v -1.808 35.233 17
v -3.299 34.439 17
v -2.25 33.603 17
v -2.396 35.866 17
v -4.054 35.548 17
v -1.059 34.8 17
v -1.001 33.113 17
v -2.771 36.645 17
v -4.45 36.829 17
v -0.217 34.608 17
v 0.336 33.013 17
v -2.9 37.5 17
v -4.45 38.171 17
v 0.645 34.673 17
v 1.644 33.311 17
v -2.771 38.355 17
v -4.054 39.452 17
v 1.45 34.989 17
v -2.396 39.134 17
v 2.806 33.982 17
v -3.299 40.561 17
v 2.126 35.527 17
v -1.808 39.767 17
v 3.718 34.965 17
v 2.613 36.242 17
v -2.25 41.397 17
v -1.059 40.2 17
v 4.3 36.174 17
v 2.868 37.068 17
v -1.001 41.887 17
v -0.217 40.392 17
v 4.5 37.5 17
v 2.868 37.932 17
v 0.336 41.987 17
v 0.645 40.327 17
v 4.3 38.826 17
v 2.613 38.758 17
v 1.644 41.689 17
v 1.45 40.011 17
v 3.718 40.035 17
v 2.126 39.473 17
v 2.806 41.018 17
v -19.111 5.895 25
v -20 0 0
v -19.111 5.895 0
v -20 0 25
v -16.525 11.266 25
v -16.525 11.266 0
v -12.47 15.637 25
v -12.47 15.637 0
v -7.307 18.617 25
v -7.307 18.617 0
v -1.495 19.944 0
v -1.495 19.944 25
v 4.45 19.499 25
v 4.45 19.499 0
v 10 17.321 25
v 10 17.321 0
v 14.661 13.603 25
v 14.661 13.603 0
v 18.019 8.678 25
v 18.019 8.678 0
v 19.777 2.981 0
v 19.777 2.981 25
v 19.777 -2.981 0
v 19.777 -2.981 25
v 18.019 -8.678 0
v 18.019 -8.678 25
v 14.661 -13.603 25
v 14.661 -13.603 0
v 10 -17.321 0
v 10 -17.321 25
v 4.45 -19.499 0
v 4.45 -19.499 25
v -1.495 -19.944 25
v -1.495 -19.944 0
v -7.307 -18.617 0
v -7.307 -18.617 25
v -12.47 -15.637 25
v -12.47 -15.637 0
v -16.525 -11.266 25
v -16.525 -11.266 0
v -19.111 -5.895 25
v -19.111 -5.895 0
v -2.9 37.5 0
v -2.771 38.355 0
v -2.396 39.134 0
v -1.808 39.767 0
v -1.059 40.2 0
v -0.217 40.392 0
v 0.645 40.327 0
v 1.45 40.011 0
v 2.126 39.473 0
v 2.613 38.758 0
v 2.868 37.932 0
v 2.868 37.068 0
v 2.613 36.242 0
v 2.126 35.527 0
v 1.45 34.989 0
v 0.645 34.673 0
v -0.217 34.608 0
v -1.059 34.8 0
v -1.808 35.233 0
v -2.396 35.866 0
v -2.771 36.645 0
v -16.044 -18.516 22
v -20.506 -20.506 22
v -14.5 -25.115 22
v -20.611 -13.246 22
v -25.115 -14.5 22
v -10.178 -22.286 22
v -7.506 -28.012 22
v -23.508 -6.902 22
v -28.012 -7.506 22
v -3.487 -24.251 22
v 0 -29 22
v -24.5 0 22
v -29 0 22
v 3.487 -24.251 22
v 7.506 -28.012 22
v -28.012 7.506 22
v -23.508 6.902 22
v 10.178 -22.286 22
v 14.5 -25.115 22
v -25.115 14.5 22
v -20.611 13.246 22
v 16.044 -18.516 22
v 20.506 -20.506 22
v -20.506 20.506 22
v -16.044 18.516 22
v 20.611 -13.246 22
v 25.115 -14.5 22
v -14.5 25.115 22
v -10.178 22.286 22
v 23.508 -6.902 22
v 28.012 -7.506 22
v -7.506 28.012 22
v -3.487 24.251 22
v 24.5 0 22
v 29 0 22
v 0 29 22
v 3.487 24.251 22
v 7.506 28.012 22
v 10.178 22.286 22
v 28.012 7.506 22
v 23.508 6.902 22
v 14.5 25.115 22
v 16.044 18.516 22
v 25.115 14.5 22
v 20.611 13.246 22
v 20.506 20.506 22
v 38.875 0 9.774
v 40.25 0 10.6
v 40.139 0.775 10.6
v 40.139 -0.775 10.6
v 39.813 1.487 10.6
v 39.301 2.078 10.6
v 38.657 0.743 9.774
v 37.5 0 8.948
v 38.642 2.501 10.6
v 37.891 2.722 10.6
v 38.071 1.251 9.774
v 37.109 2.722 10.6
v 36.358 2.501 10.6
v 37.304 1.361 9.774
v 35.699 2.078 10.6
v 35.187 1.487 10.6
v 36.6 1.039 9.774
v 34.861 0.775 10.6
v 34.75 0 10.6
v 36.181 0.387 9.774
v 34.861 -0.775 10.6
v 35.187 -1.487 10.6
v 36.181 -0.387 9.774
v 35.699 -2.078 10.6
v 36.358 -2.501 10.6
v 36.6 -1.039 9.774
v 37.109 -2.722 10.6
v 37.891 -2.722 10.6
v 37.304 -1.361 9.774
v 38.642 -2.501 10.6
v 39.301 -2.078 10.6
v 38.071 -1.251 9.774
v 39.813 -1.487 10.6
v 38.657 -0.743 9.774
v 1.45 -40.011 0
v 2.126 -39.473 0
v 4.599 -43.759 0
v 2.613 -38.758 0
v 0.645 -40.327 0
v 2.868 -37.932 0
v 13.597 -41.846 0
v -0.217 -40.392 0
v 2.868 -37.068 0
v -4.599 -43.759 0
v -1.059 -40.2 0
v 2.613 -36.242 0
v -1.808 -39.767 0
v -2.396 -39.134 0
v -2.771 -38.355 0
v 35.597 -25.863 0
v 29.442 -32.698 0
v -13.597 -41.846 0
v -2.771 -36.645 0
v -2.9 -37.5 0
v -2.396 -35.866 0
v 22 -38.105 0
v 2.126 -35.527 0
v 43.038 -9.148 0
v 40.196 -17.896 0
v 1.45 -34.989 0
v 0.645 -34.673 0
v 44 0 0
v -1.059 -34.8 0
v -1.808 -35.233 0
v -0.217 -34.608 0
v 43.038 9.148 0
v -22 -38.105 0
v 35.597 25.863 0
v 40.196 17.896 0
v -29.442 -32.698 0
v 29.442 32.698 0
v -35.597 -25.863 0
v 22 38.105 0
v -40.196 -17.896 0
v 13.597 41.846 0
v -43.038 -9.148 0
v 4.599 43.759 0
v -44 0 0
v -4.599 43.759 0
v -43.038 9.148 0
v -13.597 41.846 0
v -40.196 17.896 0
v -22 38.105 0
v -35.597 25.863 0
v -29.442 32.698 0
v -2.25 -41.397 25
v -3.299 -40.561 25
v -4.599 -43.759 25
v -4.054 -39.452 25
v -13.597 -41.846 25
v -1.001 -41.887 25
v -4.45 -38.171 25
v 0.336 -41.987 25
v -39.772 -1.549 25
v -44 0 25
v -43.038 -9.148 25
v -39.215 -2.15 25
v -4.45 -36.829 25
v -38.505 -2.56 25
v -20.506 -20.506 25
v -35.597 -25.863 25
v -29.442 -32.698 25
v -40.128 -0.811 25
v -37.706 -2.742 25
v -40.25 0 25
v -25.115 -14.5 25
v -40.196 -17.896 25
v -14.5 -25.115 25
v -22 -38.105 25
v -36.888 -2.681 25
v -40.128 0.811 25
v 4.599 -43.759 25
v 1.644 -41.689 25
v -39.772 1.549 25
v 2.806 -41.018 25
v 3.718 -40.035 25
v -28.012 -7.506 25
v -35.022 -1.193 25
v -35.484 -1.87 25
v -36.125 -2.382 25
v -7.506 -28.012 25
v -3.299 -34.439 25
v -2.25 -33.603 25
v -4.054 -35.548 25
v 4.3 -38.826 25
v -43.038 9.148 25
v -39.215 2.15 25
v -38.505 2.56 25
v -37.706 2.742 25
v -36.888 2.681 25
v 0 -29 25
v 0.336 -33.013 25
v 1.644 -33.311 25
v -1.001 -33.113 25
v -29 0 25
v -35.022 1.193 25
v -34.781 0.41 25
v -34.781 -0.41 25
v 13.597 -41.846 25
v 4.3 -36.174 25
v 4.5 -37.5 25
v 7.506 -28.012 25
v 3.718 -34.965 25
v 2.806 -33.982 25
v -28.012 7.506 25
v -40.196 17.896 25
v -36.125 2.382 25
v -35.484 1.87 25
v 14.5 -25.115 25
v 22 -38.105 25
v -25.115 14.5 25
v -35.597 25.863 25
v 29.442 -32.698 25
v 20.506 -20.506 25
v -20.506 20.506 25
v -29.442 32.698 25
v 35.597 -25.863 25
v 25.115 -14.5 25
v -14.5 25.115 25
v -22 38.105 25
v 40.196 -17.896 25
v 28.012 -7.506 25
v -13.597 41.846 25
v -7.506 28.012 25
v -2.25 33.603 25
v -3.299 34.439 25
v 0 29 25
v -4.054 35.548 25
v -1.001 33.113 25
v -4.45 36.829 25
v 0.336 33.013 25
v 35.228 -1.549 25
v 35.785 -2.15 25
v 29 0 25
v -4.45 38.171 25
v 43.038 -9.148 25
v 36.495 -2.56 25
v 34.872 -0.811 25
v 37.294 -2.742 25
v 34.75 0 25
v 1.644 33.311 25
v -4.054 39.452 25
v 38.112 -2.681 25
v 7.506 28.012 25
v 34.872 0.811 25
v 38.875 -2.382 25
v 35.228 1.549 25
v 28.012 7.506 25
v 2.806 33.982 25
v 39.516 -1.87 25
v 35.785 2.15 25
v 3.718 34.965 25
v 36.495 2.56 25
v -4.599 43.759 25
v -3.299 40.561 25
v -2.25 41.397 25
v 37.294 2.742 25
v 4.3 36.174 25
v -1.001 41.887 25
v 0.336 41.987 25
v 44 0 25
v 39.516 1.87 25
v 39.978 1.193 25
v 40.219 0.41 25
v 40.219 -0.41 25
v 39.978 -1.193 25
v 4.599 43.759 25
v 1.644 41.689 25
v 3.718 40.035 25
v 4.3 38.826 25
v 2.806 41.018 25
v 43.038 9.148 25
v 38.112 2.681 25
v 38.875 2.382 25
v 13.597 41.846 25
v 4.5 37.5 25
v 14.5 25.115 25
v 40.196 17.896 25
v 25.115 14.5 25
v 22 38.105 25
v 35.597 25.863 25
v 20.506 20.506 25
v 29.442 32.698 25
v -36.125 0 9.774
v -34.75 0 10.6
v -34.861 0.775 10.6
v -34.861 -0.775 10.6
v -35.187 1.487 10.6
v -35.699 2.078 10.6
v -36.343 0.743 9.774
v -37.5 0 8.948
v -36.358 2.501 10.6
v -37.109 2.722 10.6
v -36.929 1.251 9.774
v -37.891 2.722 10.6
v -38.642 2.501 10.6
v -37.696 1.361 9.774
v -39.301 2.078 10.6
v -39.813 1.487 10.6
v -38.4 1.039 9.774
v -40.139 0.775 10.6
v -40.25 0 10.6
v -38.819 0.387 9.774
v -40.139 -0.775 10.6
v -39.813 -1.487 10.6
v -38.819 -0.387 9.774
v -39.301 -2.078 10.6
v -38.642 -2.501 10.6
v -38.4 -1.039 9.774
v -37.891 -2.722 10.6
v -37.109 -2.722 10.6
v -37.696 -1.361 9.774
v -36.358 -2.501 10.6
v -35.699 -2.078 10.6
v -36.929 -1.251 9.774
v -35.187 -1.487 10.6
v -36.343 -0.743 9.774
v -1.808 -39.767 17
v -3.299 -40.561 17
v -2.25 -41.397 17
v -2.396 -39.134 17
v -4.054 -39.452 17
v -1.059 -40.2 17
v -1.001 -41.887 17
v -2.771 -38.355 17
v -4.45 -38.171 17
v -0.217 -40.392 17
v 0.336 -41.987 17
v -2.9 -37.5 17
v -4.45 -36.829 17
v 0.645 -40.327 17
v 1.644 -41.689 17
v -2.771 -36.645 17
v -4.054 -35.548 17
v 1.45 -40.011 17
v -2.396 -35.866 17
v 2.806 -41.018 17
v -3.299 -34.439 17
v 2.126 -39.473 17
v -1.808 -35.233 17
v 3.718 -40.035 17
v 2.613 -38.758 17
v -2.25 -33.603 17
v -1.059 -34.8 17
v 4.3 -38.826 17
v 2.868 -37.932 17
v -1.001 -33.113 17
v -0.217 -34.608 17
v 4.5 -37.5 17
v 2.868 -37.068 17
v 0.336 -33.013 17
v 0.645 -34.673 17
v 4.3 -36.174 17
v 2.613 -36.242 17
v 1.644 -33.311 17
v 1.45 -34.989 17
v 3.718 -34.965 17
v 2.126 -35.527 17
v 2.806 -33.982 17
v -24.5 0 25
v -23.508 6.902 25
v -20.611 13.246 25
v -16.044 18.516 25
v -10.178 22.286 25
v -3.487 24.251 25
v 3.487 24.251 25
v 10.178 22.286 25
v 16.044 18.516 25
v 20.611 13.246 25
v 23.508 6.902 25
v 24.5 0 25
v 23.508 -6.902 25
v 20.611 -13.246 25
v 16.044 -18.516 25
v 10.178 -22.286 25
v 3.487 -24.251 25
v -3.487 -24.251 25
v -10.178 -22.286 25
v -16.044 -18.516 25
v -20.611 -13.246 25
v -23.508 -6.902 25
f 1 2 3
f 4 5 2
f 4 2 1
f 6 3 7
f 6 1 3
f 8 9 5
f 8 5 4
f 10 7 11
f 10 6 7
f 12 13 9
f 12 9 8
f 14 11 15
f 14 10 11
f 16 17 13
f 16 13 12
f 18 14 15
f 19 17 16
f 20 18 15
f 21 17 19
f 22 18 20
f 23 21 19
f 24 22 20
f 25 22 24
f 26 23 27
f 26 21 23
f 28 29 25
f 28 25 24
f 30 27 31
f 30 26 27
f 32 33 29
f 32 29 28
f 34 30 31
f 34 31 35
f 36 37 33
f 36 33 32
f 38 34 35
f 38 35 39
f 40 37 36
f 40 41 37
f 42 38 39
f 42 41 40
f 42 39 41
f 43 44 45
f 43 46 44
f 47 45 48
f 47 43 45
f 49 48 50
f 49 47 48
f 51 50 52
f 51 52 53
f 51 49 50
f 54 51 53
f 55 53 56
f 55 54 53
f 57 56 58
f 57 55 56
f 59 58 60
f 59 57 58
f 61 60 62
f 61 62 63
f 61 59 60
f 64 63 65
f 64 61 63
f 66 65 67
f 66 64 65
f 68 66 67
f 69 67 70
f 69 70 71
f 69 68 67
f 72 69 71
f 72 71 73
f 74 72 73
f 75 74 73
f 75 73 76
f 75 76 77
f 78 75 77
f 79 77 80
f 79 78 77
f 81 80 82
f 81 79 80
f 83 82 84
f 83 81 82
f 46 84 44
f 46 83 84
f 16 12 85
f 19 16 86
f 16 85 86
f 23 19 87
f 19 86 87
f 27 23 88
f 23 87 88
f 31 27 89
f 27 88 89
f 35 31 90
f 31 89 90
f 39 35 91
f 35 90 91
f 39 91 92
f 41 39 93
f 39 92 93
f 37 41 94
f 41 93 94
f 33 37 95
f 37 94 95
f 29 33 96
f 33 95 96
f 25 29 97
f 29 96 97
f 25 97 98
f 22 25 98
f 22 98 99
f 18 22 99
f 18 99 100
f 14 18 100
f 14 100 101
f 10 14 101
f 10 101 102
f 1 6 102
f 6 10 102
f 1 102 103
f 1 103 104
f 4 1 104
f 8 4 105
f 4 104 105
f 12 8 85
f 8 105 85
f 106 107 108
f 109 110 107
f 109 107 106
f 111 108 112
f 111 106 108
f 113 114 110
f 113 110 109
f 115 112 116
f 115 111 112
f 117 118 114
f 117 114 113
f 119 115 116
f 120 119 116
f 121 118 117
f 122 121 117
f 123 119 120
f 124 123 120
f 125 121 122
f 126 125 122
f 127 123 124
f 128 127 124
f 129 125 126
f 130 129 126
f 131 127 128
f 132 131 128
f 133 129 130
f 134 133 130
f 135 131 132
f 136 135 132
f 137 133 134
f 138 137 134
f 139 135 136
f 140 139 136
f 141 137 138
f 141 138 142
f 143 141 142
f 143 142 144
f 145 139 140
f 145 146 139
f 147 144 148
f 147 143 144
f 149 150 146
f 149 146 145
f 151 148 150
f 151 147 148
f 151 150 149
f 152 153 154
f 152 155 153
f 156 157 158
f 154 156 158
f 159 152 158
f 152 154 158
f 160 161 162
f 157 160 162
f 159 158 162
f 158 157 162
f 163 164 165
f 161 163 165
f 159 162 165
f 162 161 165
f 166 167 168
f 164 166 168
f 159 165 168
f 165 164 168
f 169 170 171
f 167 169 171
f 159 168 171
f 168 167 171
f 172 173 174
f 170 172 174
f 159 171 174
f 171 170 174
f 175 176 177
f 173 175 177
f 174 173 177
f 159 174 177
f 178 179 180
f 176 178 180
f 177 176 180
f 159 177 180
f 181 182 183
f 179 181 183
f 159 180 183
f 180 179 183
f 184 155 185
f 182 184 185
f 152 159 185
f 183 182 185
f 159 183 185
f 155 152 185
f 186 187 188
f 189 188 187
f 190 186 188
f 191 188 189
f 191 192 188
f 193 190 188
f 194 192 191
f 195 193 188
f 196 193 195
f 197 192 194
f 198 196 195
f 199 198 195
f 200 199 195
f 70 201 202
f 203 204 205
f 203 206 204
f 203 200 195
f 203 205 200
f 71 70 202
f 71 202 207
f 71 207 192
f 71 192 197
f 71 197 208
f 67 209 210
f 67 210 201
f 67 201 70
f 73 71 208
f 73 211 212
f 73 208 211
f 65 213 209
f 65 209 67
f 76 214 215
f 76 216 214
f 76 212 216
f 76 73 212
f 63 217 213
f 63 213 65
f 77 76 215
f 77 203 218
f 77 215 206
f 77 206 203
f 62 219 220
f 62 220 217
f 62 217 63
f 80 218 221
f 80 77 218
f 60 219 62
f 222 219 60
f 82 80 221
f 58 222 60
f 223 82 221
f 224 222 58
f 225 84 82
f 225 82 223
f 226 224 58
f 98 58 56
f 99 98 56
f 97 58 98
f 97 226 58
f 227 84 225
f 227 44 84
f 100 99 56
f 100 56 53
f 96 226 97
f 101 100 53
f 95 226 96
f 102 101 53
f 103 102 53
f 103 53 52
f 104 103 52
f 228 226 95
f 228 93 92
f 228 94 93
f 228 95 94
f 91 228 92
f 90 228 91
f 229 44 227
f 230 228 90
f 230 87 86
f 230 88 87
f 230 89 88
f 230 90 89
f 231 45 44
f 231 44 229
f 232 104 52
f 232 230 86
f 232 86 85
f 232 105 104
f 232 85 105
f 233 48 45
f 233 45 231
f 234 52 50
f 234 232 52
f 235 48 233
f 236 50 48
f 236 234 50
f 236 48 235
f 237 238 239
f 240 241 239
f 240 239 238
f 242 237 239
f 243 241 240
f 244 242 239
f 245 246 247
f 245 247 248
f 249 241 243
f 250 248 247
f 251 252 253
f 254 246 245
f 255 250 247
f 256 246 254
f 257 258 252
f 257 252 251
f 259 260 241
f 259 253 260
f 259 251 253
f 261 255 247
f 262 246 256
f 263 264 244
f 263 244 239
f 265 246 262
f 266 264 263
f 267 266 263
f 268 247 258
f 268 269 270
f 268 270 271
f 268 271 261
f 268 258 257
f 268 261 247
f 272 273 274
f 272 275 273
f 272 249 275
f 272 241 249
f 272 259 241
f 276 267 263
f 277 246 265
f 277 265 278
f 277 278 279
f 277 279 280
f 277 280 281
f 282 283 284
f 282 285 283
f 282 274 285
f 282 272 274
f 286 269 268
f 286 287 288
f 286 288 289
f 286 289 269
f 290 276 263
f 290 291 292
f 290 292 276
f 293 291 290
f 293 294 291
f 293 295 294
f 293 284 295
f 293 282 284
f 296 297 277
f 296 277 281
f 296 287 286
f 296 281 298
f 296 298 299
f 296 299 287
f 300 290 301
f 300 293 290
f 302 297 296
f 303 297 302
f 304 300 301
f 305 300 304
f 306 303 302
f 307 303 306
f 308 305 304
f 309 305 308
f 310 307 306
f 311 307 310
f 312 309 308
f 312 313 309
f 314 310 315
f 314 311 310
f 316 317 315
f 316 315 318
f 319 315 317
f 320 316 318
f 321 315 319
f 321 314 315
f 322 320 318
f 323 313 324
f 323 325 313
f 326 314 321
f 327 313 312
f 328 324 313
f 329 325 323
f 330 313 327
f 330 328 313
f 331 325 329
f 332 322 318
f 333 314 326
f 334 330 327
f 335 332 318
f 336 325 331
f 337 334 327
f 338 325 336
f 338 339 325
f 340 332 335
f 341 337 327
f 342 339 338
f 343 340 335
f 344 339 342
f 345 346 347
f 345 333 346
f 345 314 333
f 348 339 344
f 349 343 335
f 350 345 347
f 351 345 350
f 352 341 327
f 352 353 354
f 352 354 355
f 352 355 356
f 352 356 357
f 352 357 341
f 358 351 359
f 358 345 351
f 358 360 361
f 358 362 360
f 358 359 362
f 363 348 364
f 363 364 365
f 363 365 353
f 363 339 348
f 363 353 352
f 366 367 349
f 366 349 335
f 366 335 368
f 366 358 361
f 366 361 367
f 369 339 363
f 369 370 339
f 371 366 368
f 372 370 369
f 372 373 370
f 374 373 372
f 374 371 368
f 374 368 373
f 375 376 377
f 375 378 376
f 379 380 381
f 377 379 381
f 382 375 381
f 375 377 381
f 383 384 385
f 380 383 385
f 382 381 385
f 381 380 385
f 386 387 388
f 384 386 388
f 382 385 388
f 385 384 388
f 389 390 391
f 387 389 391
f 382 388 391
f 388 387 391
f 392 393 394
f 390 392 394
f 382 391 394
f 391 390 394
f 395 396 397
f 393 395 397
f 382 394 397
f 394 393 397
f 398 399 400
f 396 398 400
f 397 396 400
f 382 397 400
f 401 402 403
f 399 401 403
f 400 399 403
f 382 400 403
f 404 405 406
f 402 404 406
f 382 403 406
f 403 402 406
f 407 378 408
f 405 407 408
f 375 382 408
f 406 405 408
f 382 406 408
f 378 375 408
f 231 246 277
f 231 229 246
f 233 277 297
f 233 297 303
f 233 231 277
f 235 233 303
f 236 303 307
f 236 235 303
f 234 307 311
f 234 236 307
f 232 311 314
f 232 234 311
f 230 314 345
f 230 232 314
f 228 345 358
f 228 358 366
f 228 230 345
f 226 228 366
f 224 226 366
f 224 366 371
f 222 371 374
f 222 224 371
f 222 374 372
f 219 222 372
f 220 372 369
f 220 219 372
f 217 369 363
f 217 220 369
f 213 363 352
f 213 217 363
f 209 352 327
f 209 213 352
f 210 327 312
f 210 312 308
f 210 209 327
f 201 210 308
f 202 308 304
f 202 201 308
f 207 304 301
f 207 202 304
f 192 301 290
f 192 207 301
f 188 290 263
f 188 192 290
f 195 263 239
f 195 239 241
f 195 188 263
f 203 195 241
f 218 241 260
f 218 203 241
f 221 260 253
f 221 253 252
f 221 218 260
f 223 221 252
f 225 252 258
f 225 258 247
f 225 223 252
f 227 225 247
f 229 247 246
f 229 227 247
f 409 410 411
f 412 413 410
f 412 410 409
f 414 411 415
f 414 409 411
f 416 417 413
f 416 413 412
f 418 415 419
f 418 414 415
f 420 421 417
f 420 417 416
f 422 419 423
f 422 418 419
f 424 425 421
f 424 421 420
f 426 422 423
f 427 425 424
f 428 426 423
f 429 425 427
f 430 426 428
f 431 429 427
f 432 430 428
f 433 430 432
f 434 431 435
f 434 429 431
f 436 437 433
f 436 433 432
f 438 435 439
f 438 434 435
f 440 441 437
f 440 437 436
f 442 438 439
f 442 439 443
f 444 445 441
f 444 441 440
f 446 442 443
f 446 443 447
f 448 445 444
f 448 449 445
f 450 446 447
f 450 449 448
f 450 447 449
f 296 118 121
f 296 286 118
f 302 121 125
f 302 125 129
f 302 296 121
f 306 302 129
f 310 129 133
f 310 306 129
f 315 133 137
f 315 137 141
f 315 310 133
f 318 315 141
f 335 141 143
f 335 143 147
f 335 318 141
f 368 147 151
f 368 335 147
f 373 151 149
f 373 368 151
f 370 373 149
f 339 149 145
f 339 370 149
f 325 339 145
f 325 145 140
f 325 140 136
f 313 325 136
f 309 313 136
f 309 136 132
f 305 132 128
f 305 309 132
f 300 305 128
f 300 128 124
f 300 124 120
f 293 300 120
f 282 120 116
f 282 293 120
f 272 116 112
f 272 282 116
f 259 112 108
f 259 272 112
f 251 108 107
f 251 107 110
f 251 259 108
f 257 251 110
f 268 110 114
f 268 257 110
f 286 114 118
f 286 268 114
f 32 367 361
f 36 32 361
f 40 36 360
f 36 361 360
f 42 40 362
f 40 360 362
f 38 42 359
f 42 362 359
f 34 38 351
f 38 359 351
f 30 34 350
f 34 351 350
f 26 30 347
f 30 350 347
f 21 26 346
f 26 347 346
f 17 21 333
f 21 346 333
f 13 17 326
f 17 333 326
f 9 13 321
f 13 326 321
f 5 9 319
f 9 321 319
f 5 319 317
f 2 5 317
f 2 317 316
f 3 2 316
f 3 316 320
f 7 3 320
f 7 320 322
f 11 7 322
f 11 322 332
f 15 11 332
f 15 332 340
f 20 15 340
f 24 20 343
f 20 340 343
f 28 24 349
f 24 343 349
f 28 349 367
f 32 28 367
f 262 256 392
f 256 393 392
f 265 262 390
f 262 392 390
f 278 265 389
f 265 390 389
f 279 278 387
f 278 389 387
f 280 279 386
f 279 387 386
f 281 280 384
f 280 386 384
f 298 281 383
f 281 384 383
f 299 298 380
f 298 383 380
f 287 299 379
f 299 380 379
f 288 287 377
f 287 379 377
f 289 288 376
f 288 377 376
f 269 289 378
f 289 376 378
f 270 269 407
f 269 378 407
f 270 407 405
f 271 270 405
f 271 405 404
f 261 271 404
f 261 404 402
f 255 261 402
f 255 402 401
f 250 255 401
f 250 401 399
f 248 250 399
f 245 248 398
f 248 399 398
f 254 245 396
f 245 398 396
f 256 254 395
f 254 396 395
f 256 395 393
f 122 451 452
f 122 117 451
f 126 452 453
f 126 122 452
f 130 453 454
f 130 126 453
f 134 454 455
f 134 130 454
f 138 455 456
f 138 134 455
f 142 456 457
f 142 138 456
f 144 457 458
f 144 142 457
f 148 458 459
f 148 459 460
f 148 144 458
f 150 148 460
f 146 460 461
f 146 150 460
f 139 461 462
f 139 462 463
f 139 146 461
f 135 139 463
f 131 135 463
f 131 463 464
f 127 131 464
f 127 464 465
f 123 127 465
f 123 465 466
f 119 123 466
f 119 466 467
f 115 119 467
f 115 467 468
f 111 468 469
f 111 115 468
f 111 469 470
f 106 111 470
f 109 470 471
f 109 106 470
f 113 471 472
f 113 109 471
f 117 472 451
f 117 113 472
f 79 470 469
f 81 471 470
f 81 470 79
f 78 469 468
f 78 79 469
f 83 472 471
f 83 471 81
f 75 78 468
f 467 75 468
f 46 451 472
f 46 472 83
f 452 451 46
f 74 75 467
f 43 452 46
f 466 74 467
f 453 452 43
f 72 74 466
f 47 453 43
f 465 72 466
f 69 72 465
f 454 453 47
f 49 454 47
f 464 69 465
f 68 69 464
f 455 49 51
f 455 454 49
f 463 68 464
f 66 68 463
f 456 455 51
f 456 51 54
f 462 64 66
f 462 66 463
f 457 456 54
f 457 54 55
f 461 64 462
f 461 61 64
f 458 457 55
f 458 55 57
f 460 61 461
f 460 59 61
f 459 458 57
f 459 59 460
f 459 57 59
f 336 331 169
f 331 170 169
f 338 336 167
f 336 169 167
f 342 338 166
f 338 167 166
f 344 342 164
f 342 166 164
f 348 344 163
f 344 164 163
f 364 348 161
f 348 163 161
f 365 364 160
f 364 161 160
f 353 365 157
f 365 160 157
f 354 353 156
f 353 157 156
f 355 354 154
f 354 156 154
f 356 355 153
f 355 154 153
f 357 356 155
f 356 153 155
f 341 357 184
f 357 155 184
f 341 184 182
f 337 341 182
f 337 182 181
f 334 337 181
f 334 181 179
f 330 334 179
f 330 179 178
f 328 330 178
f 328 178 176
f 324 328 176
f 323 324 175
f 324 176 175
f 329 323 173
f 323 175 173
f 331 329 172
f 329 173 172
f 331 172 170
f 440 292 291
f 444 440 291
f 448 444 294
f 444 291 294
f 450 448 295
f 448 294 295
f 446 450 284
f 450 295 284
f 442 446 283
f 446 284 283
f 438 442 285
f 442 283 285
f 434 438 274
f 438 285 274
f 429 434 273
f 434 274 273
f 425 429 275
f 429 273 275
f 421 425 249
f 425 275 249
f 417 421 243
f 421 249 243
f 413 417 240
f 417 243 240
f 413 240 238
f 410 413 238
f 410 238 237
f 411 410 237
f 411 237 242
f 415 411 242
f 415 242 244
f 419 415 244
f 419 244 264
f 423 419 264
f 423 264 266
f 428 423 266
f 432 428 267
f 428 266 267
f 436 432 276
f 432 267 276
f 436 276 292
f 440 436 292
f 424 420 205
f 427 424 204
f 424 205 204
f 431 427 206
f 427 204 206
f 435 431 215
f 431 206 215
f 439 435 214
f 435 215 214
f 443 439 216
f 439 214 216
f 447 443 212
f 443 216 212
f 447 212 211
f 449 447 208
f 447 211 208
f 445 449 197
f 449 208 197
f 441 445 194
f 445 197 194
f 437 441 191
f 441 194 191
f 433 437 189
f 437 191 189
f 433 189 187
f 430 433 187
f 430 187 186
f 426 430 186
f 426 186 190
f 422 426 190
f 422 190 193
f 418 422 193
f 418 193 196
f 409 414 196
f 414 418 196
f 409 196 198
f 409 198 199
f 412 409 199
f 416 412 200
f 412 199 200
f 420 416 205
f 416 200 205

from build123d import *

# Parameters (mm, degrees)
F3_D     = 5.8
F3_DEPTH = 40
F3_TIP   = 1.7424957952
F5_D     = 5.5
F5_DEPTH = 14.4
F5_TIP   = 1.6523667023
F6_R     = 4.5
F6_R_2   = 2.9
F7_DEPTH = 8


with BuildPart() as f1:
    # F0 (on Front) → F1 (revolve)
    with BuildSketch(Plane.XZ):
        Polygon((-20, 0), (-20, 25), (-24.5, 25), (-24.5, 22), (-29, 22), (-29, 25), (-44, 25), (-44, 17), (-44, 8), (-44, 0), align=None)
    revolve(axis=Axis((0, 0, 12.5), (0, 0, -1)))

    # F3
    with Locations(Plane.XY.offset(25)):
        with Locations((0, 37.5), (0, -37.5)):
            Hole(F3_D / 2, depth=F3_DEPTH)
            with Locations((0, 0, -(F3_DEPTH + F3_TIP / 2))):  # 118° drill point
                Cone(0, F3_D / 2, F3_TIP, mode=Mode.SUBTRACT)

    # F5
    with Locations(Plane.XY.offset(25)):
        with Locations((-37.5, 0), (37.5, 0)):
            Hole(F5_D / 2, depth=F5_DEPTH)
            with Locations((0, 0, -(F5_DEPTH + F5_TIP / 2))):  # 118° drill point
                Cone(0, F5_D / 2, F5_TIP, mode=Mode.SUBTRACT)

    # F6 (on face) → F7 (cut)
    with BuildSketch(Plane.XY.offset(25)):
        with Locations((0, 37.5)):
            Circle(F6_R)
        with Locations((0, 37.5)):
            Circle(F6_R_2, mode=Mode.SUBTRACT)
        with Locations((0, -37.5)):
            Circle(F6_R)
        with Locations((0, -37.5)):
            Circle(F6_R_2, mode=Mode.SUBTRACT)
    extrude(amount=-F7_DEPTH, mode=Mode.SUBTRACT)


solid = f1.part
